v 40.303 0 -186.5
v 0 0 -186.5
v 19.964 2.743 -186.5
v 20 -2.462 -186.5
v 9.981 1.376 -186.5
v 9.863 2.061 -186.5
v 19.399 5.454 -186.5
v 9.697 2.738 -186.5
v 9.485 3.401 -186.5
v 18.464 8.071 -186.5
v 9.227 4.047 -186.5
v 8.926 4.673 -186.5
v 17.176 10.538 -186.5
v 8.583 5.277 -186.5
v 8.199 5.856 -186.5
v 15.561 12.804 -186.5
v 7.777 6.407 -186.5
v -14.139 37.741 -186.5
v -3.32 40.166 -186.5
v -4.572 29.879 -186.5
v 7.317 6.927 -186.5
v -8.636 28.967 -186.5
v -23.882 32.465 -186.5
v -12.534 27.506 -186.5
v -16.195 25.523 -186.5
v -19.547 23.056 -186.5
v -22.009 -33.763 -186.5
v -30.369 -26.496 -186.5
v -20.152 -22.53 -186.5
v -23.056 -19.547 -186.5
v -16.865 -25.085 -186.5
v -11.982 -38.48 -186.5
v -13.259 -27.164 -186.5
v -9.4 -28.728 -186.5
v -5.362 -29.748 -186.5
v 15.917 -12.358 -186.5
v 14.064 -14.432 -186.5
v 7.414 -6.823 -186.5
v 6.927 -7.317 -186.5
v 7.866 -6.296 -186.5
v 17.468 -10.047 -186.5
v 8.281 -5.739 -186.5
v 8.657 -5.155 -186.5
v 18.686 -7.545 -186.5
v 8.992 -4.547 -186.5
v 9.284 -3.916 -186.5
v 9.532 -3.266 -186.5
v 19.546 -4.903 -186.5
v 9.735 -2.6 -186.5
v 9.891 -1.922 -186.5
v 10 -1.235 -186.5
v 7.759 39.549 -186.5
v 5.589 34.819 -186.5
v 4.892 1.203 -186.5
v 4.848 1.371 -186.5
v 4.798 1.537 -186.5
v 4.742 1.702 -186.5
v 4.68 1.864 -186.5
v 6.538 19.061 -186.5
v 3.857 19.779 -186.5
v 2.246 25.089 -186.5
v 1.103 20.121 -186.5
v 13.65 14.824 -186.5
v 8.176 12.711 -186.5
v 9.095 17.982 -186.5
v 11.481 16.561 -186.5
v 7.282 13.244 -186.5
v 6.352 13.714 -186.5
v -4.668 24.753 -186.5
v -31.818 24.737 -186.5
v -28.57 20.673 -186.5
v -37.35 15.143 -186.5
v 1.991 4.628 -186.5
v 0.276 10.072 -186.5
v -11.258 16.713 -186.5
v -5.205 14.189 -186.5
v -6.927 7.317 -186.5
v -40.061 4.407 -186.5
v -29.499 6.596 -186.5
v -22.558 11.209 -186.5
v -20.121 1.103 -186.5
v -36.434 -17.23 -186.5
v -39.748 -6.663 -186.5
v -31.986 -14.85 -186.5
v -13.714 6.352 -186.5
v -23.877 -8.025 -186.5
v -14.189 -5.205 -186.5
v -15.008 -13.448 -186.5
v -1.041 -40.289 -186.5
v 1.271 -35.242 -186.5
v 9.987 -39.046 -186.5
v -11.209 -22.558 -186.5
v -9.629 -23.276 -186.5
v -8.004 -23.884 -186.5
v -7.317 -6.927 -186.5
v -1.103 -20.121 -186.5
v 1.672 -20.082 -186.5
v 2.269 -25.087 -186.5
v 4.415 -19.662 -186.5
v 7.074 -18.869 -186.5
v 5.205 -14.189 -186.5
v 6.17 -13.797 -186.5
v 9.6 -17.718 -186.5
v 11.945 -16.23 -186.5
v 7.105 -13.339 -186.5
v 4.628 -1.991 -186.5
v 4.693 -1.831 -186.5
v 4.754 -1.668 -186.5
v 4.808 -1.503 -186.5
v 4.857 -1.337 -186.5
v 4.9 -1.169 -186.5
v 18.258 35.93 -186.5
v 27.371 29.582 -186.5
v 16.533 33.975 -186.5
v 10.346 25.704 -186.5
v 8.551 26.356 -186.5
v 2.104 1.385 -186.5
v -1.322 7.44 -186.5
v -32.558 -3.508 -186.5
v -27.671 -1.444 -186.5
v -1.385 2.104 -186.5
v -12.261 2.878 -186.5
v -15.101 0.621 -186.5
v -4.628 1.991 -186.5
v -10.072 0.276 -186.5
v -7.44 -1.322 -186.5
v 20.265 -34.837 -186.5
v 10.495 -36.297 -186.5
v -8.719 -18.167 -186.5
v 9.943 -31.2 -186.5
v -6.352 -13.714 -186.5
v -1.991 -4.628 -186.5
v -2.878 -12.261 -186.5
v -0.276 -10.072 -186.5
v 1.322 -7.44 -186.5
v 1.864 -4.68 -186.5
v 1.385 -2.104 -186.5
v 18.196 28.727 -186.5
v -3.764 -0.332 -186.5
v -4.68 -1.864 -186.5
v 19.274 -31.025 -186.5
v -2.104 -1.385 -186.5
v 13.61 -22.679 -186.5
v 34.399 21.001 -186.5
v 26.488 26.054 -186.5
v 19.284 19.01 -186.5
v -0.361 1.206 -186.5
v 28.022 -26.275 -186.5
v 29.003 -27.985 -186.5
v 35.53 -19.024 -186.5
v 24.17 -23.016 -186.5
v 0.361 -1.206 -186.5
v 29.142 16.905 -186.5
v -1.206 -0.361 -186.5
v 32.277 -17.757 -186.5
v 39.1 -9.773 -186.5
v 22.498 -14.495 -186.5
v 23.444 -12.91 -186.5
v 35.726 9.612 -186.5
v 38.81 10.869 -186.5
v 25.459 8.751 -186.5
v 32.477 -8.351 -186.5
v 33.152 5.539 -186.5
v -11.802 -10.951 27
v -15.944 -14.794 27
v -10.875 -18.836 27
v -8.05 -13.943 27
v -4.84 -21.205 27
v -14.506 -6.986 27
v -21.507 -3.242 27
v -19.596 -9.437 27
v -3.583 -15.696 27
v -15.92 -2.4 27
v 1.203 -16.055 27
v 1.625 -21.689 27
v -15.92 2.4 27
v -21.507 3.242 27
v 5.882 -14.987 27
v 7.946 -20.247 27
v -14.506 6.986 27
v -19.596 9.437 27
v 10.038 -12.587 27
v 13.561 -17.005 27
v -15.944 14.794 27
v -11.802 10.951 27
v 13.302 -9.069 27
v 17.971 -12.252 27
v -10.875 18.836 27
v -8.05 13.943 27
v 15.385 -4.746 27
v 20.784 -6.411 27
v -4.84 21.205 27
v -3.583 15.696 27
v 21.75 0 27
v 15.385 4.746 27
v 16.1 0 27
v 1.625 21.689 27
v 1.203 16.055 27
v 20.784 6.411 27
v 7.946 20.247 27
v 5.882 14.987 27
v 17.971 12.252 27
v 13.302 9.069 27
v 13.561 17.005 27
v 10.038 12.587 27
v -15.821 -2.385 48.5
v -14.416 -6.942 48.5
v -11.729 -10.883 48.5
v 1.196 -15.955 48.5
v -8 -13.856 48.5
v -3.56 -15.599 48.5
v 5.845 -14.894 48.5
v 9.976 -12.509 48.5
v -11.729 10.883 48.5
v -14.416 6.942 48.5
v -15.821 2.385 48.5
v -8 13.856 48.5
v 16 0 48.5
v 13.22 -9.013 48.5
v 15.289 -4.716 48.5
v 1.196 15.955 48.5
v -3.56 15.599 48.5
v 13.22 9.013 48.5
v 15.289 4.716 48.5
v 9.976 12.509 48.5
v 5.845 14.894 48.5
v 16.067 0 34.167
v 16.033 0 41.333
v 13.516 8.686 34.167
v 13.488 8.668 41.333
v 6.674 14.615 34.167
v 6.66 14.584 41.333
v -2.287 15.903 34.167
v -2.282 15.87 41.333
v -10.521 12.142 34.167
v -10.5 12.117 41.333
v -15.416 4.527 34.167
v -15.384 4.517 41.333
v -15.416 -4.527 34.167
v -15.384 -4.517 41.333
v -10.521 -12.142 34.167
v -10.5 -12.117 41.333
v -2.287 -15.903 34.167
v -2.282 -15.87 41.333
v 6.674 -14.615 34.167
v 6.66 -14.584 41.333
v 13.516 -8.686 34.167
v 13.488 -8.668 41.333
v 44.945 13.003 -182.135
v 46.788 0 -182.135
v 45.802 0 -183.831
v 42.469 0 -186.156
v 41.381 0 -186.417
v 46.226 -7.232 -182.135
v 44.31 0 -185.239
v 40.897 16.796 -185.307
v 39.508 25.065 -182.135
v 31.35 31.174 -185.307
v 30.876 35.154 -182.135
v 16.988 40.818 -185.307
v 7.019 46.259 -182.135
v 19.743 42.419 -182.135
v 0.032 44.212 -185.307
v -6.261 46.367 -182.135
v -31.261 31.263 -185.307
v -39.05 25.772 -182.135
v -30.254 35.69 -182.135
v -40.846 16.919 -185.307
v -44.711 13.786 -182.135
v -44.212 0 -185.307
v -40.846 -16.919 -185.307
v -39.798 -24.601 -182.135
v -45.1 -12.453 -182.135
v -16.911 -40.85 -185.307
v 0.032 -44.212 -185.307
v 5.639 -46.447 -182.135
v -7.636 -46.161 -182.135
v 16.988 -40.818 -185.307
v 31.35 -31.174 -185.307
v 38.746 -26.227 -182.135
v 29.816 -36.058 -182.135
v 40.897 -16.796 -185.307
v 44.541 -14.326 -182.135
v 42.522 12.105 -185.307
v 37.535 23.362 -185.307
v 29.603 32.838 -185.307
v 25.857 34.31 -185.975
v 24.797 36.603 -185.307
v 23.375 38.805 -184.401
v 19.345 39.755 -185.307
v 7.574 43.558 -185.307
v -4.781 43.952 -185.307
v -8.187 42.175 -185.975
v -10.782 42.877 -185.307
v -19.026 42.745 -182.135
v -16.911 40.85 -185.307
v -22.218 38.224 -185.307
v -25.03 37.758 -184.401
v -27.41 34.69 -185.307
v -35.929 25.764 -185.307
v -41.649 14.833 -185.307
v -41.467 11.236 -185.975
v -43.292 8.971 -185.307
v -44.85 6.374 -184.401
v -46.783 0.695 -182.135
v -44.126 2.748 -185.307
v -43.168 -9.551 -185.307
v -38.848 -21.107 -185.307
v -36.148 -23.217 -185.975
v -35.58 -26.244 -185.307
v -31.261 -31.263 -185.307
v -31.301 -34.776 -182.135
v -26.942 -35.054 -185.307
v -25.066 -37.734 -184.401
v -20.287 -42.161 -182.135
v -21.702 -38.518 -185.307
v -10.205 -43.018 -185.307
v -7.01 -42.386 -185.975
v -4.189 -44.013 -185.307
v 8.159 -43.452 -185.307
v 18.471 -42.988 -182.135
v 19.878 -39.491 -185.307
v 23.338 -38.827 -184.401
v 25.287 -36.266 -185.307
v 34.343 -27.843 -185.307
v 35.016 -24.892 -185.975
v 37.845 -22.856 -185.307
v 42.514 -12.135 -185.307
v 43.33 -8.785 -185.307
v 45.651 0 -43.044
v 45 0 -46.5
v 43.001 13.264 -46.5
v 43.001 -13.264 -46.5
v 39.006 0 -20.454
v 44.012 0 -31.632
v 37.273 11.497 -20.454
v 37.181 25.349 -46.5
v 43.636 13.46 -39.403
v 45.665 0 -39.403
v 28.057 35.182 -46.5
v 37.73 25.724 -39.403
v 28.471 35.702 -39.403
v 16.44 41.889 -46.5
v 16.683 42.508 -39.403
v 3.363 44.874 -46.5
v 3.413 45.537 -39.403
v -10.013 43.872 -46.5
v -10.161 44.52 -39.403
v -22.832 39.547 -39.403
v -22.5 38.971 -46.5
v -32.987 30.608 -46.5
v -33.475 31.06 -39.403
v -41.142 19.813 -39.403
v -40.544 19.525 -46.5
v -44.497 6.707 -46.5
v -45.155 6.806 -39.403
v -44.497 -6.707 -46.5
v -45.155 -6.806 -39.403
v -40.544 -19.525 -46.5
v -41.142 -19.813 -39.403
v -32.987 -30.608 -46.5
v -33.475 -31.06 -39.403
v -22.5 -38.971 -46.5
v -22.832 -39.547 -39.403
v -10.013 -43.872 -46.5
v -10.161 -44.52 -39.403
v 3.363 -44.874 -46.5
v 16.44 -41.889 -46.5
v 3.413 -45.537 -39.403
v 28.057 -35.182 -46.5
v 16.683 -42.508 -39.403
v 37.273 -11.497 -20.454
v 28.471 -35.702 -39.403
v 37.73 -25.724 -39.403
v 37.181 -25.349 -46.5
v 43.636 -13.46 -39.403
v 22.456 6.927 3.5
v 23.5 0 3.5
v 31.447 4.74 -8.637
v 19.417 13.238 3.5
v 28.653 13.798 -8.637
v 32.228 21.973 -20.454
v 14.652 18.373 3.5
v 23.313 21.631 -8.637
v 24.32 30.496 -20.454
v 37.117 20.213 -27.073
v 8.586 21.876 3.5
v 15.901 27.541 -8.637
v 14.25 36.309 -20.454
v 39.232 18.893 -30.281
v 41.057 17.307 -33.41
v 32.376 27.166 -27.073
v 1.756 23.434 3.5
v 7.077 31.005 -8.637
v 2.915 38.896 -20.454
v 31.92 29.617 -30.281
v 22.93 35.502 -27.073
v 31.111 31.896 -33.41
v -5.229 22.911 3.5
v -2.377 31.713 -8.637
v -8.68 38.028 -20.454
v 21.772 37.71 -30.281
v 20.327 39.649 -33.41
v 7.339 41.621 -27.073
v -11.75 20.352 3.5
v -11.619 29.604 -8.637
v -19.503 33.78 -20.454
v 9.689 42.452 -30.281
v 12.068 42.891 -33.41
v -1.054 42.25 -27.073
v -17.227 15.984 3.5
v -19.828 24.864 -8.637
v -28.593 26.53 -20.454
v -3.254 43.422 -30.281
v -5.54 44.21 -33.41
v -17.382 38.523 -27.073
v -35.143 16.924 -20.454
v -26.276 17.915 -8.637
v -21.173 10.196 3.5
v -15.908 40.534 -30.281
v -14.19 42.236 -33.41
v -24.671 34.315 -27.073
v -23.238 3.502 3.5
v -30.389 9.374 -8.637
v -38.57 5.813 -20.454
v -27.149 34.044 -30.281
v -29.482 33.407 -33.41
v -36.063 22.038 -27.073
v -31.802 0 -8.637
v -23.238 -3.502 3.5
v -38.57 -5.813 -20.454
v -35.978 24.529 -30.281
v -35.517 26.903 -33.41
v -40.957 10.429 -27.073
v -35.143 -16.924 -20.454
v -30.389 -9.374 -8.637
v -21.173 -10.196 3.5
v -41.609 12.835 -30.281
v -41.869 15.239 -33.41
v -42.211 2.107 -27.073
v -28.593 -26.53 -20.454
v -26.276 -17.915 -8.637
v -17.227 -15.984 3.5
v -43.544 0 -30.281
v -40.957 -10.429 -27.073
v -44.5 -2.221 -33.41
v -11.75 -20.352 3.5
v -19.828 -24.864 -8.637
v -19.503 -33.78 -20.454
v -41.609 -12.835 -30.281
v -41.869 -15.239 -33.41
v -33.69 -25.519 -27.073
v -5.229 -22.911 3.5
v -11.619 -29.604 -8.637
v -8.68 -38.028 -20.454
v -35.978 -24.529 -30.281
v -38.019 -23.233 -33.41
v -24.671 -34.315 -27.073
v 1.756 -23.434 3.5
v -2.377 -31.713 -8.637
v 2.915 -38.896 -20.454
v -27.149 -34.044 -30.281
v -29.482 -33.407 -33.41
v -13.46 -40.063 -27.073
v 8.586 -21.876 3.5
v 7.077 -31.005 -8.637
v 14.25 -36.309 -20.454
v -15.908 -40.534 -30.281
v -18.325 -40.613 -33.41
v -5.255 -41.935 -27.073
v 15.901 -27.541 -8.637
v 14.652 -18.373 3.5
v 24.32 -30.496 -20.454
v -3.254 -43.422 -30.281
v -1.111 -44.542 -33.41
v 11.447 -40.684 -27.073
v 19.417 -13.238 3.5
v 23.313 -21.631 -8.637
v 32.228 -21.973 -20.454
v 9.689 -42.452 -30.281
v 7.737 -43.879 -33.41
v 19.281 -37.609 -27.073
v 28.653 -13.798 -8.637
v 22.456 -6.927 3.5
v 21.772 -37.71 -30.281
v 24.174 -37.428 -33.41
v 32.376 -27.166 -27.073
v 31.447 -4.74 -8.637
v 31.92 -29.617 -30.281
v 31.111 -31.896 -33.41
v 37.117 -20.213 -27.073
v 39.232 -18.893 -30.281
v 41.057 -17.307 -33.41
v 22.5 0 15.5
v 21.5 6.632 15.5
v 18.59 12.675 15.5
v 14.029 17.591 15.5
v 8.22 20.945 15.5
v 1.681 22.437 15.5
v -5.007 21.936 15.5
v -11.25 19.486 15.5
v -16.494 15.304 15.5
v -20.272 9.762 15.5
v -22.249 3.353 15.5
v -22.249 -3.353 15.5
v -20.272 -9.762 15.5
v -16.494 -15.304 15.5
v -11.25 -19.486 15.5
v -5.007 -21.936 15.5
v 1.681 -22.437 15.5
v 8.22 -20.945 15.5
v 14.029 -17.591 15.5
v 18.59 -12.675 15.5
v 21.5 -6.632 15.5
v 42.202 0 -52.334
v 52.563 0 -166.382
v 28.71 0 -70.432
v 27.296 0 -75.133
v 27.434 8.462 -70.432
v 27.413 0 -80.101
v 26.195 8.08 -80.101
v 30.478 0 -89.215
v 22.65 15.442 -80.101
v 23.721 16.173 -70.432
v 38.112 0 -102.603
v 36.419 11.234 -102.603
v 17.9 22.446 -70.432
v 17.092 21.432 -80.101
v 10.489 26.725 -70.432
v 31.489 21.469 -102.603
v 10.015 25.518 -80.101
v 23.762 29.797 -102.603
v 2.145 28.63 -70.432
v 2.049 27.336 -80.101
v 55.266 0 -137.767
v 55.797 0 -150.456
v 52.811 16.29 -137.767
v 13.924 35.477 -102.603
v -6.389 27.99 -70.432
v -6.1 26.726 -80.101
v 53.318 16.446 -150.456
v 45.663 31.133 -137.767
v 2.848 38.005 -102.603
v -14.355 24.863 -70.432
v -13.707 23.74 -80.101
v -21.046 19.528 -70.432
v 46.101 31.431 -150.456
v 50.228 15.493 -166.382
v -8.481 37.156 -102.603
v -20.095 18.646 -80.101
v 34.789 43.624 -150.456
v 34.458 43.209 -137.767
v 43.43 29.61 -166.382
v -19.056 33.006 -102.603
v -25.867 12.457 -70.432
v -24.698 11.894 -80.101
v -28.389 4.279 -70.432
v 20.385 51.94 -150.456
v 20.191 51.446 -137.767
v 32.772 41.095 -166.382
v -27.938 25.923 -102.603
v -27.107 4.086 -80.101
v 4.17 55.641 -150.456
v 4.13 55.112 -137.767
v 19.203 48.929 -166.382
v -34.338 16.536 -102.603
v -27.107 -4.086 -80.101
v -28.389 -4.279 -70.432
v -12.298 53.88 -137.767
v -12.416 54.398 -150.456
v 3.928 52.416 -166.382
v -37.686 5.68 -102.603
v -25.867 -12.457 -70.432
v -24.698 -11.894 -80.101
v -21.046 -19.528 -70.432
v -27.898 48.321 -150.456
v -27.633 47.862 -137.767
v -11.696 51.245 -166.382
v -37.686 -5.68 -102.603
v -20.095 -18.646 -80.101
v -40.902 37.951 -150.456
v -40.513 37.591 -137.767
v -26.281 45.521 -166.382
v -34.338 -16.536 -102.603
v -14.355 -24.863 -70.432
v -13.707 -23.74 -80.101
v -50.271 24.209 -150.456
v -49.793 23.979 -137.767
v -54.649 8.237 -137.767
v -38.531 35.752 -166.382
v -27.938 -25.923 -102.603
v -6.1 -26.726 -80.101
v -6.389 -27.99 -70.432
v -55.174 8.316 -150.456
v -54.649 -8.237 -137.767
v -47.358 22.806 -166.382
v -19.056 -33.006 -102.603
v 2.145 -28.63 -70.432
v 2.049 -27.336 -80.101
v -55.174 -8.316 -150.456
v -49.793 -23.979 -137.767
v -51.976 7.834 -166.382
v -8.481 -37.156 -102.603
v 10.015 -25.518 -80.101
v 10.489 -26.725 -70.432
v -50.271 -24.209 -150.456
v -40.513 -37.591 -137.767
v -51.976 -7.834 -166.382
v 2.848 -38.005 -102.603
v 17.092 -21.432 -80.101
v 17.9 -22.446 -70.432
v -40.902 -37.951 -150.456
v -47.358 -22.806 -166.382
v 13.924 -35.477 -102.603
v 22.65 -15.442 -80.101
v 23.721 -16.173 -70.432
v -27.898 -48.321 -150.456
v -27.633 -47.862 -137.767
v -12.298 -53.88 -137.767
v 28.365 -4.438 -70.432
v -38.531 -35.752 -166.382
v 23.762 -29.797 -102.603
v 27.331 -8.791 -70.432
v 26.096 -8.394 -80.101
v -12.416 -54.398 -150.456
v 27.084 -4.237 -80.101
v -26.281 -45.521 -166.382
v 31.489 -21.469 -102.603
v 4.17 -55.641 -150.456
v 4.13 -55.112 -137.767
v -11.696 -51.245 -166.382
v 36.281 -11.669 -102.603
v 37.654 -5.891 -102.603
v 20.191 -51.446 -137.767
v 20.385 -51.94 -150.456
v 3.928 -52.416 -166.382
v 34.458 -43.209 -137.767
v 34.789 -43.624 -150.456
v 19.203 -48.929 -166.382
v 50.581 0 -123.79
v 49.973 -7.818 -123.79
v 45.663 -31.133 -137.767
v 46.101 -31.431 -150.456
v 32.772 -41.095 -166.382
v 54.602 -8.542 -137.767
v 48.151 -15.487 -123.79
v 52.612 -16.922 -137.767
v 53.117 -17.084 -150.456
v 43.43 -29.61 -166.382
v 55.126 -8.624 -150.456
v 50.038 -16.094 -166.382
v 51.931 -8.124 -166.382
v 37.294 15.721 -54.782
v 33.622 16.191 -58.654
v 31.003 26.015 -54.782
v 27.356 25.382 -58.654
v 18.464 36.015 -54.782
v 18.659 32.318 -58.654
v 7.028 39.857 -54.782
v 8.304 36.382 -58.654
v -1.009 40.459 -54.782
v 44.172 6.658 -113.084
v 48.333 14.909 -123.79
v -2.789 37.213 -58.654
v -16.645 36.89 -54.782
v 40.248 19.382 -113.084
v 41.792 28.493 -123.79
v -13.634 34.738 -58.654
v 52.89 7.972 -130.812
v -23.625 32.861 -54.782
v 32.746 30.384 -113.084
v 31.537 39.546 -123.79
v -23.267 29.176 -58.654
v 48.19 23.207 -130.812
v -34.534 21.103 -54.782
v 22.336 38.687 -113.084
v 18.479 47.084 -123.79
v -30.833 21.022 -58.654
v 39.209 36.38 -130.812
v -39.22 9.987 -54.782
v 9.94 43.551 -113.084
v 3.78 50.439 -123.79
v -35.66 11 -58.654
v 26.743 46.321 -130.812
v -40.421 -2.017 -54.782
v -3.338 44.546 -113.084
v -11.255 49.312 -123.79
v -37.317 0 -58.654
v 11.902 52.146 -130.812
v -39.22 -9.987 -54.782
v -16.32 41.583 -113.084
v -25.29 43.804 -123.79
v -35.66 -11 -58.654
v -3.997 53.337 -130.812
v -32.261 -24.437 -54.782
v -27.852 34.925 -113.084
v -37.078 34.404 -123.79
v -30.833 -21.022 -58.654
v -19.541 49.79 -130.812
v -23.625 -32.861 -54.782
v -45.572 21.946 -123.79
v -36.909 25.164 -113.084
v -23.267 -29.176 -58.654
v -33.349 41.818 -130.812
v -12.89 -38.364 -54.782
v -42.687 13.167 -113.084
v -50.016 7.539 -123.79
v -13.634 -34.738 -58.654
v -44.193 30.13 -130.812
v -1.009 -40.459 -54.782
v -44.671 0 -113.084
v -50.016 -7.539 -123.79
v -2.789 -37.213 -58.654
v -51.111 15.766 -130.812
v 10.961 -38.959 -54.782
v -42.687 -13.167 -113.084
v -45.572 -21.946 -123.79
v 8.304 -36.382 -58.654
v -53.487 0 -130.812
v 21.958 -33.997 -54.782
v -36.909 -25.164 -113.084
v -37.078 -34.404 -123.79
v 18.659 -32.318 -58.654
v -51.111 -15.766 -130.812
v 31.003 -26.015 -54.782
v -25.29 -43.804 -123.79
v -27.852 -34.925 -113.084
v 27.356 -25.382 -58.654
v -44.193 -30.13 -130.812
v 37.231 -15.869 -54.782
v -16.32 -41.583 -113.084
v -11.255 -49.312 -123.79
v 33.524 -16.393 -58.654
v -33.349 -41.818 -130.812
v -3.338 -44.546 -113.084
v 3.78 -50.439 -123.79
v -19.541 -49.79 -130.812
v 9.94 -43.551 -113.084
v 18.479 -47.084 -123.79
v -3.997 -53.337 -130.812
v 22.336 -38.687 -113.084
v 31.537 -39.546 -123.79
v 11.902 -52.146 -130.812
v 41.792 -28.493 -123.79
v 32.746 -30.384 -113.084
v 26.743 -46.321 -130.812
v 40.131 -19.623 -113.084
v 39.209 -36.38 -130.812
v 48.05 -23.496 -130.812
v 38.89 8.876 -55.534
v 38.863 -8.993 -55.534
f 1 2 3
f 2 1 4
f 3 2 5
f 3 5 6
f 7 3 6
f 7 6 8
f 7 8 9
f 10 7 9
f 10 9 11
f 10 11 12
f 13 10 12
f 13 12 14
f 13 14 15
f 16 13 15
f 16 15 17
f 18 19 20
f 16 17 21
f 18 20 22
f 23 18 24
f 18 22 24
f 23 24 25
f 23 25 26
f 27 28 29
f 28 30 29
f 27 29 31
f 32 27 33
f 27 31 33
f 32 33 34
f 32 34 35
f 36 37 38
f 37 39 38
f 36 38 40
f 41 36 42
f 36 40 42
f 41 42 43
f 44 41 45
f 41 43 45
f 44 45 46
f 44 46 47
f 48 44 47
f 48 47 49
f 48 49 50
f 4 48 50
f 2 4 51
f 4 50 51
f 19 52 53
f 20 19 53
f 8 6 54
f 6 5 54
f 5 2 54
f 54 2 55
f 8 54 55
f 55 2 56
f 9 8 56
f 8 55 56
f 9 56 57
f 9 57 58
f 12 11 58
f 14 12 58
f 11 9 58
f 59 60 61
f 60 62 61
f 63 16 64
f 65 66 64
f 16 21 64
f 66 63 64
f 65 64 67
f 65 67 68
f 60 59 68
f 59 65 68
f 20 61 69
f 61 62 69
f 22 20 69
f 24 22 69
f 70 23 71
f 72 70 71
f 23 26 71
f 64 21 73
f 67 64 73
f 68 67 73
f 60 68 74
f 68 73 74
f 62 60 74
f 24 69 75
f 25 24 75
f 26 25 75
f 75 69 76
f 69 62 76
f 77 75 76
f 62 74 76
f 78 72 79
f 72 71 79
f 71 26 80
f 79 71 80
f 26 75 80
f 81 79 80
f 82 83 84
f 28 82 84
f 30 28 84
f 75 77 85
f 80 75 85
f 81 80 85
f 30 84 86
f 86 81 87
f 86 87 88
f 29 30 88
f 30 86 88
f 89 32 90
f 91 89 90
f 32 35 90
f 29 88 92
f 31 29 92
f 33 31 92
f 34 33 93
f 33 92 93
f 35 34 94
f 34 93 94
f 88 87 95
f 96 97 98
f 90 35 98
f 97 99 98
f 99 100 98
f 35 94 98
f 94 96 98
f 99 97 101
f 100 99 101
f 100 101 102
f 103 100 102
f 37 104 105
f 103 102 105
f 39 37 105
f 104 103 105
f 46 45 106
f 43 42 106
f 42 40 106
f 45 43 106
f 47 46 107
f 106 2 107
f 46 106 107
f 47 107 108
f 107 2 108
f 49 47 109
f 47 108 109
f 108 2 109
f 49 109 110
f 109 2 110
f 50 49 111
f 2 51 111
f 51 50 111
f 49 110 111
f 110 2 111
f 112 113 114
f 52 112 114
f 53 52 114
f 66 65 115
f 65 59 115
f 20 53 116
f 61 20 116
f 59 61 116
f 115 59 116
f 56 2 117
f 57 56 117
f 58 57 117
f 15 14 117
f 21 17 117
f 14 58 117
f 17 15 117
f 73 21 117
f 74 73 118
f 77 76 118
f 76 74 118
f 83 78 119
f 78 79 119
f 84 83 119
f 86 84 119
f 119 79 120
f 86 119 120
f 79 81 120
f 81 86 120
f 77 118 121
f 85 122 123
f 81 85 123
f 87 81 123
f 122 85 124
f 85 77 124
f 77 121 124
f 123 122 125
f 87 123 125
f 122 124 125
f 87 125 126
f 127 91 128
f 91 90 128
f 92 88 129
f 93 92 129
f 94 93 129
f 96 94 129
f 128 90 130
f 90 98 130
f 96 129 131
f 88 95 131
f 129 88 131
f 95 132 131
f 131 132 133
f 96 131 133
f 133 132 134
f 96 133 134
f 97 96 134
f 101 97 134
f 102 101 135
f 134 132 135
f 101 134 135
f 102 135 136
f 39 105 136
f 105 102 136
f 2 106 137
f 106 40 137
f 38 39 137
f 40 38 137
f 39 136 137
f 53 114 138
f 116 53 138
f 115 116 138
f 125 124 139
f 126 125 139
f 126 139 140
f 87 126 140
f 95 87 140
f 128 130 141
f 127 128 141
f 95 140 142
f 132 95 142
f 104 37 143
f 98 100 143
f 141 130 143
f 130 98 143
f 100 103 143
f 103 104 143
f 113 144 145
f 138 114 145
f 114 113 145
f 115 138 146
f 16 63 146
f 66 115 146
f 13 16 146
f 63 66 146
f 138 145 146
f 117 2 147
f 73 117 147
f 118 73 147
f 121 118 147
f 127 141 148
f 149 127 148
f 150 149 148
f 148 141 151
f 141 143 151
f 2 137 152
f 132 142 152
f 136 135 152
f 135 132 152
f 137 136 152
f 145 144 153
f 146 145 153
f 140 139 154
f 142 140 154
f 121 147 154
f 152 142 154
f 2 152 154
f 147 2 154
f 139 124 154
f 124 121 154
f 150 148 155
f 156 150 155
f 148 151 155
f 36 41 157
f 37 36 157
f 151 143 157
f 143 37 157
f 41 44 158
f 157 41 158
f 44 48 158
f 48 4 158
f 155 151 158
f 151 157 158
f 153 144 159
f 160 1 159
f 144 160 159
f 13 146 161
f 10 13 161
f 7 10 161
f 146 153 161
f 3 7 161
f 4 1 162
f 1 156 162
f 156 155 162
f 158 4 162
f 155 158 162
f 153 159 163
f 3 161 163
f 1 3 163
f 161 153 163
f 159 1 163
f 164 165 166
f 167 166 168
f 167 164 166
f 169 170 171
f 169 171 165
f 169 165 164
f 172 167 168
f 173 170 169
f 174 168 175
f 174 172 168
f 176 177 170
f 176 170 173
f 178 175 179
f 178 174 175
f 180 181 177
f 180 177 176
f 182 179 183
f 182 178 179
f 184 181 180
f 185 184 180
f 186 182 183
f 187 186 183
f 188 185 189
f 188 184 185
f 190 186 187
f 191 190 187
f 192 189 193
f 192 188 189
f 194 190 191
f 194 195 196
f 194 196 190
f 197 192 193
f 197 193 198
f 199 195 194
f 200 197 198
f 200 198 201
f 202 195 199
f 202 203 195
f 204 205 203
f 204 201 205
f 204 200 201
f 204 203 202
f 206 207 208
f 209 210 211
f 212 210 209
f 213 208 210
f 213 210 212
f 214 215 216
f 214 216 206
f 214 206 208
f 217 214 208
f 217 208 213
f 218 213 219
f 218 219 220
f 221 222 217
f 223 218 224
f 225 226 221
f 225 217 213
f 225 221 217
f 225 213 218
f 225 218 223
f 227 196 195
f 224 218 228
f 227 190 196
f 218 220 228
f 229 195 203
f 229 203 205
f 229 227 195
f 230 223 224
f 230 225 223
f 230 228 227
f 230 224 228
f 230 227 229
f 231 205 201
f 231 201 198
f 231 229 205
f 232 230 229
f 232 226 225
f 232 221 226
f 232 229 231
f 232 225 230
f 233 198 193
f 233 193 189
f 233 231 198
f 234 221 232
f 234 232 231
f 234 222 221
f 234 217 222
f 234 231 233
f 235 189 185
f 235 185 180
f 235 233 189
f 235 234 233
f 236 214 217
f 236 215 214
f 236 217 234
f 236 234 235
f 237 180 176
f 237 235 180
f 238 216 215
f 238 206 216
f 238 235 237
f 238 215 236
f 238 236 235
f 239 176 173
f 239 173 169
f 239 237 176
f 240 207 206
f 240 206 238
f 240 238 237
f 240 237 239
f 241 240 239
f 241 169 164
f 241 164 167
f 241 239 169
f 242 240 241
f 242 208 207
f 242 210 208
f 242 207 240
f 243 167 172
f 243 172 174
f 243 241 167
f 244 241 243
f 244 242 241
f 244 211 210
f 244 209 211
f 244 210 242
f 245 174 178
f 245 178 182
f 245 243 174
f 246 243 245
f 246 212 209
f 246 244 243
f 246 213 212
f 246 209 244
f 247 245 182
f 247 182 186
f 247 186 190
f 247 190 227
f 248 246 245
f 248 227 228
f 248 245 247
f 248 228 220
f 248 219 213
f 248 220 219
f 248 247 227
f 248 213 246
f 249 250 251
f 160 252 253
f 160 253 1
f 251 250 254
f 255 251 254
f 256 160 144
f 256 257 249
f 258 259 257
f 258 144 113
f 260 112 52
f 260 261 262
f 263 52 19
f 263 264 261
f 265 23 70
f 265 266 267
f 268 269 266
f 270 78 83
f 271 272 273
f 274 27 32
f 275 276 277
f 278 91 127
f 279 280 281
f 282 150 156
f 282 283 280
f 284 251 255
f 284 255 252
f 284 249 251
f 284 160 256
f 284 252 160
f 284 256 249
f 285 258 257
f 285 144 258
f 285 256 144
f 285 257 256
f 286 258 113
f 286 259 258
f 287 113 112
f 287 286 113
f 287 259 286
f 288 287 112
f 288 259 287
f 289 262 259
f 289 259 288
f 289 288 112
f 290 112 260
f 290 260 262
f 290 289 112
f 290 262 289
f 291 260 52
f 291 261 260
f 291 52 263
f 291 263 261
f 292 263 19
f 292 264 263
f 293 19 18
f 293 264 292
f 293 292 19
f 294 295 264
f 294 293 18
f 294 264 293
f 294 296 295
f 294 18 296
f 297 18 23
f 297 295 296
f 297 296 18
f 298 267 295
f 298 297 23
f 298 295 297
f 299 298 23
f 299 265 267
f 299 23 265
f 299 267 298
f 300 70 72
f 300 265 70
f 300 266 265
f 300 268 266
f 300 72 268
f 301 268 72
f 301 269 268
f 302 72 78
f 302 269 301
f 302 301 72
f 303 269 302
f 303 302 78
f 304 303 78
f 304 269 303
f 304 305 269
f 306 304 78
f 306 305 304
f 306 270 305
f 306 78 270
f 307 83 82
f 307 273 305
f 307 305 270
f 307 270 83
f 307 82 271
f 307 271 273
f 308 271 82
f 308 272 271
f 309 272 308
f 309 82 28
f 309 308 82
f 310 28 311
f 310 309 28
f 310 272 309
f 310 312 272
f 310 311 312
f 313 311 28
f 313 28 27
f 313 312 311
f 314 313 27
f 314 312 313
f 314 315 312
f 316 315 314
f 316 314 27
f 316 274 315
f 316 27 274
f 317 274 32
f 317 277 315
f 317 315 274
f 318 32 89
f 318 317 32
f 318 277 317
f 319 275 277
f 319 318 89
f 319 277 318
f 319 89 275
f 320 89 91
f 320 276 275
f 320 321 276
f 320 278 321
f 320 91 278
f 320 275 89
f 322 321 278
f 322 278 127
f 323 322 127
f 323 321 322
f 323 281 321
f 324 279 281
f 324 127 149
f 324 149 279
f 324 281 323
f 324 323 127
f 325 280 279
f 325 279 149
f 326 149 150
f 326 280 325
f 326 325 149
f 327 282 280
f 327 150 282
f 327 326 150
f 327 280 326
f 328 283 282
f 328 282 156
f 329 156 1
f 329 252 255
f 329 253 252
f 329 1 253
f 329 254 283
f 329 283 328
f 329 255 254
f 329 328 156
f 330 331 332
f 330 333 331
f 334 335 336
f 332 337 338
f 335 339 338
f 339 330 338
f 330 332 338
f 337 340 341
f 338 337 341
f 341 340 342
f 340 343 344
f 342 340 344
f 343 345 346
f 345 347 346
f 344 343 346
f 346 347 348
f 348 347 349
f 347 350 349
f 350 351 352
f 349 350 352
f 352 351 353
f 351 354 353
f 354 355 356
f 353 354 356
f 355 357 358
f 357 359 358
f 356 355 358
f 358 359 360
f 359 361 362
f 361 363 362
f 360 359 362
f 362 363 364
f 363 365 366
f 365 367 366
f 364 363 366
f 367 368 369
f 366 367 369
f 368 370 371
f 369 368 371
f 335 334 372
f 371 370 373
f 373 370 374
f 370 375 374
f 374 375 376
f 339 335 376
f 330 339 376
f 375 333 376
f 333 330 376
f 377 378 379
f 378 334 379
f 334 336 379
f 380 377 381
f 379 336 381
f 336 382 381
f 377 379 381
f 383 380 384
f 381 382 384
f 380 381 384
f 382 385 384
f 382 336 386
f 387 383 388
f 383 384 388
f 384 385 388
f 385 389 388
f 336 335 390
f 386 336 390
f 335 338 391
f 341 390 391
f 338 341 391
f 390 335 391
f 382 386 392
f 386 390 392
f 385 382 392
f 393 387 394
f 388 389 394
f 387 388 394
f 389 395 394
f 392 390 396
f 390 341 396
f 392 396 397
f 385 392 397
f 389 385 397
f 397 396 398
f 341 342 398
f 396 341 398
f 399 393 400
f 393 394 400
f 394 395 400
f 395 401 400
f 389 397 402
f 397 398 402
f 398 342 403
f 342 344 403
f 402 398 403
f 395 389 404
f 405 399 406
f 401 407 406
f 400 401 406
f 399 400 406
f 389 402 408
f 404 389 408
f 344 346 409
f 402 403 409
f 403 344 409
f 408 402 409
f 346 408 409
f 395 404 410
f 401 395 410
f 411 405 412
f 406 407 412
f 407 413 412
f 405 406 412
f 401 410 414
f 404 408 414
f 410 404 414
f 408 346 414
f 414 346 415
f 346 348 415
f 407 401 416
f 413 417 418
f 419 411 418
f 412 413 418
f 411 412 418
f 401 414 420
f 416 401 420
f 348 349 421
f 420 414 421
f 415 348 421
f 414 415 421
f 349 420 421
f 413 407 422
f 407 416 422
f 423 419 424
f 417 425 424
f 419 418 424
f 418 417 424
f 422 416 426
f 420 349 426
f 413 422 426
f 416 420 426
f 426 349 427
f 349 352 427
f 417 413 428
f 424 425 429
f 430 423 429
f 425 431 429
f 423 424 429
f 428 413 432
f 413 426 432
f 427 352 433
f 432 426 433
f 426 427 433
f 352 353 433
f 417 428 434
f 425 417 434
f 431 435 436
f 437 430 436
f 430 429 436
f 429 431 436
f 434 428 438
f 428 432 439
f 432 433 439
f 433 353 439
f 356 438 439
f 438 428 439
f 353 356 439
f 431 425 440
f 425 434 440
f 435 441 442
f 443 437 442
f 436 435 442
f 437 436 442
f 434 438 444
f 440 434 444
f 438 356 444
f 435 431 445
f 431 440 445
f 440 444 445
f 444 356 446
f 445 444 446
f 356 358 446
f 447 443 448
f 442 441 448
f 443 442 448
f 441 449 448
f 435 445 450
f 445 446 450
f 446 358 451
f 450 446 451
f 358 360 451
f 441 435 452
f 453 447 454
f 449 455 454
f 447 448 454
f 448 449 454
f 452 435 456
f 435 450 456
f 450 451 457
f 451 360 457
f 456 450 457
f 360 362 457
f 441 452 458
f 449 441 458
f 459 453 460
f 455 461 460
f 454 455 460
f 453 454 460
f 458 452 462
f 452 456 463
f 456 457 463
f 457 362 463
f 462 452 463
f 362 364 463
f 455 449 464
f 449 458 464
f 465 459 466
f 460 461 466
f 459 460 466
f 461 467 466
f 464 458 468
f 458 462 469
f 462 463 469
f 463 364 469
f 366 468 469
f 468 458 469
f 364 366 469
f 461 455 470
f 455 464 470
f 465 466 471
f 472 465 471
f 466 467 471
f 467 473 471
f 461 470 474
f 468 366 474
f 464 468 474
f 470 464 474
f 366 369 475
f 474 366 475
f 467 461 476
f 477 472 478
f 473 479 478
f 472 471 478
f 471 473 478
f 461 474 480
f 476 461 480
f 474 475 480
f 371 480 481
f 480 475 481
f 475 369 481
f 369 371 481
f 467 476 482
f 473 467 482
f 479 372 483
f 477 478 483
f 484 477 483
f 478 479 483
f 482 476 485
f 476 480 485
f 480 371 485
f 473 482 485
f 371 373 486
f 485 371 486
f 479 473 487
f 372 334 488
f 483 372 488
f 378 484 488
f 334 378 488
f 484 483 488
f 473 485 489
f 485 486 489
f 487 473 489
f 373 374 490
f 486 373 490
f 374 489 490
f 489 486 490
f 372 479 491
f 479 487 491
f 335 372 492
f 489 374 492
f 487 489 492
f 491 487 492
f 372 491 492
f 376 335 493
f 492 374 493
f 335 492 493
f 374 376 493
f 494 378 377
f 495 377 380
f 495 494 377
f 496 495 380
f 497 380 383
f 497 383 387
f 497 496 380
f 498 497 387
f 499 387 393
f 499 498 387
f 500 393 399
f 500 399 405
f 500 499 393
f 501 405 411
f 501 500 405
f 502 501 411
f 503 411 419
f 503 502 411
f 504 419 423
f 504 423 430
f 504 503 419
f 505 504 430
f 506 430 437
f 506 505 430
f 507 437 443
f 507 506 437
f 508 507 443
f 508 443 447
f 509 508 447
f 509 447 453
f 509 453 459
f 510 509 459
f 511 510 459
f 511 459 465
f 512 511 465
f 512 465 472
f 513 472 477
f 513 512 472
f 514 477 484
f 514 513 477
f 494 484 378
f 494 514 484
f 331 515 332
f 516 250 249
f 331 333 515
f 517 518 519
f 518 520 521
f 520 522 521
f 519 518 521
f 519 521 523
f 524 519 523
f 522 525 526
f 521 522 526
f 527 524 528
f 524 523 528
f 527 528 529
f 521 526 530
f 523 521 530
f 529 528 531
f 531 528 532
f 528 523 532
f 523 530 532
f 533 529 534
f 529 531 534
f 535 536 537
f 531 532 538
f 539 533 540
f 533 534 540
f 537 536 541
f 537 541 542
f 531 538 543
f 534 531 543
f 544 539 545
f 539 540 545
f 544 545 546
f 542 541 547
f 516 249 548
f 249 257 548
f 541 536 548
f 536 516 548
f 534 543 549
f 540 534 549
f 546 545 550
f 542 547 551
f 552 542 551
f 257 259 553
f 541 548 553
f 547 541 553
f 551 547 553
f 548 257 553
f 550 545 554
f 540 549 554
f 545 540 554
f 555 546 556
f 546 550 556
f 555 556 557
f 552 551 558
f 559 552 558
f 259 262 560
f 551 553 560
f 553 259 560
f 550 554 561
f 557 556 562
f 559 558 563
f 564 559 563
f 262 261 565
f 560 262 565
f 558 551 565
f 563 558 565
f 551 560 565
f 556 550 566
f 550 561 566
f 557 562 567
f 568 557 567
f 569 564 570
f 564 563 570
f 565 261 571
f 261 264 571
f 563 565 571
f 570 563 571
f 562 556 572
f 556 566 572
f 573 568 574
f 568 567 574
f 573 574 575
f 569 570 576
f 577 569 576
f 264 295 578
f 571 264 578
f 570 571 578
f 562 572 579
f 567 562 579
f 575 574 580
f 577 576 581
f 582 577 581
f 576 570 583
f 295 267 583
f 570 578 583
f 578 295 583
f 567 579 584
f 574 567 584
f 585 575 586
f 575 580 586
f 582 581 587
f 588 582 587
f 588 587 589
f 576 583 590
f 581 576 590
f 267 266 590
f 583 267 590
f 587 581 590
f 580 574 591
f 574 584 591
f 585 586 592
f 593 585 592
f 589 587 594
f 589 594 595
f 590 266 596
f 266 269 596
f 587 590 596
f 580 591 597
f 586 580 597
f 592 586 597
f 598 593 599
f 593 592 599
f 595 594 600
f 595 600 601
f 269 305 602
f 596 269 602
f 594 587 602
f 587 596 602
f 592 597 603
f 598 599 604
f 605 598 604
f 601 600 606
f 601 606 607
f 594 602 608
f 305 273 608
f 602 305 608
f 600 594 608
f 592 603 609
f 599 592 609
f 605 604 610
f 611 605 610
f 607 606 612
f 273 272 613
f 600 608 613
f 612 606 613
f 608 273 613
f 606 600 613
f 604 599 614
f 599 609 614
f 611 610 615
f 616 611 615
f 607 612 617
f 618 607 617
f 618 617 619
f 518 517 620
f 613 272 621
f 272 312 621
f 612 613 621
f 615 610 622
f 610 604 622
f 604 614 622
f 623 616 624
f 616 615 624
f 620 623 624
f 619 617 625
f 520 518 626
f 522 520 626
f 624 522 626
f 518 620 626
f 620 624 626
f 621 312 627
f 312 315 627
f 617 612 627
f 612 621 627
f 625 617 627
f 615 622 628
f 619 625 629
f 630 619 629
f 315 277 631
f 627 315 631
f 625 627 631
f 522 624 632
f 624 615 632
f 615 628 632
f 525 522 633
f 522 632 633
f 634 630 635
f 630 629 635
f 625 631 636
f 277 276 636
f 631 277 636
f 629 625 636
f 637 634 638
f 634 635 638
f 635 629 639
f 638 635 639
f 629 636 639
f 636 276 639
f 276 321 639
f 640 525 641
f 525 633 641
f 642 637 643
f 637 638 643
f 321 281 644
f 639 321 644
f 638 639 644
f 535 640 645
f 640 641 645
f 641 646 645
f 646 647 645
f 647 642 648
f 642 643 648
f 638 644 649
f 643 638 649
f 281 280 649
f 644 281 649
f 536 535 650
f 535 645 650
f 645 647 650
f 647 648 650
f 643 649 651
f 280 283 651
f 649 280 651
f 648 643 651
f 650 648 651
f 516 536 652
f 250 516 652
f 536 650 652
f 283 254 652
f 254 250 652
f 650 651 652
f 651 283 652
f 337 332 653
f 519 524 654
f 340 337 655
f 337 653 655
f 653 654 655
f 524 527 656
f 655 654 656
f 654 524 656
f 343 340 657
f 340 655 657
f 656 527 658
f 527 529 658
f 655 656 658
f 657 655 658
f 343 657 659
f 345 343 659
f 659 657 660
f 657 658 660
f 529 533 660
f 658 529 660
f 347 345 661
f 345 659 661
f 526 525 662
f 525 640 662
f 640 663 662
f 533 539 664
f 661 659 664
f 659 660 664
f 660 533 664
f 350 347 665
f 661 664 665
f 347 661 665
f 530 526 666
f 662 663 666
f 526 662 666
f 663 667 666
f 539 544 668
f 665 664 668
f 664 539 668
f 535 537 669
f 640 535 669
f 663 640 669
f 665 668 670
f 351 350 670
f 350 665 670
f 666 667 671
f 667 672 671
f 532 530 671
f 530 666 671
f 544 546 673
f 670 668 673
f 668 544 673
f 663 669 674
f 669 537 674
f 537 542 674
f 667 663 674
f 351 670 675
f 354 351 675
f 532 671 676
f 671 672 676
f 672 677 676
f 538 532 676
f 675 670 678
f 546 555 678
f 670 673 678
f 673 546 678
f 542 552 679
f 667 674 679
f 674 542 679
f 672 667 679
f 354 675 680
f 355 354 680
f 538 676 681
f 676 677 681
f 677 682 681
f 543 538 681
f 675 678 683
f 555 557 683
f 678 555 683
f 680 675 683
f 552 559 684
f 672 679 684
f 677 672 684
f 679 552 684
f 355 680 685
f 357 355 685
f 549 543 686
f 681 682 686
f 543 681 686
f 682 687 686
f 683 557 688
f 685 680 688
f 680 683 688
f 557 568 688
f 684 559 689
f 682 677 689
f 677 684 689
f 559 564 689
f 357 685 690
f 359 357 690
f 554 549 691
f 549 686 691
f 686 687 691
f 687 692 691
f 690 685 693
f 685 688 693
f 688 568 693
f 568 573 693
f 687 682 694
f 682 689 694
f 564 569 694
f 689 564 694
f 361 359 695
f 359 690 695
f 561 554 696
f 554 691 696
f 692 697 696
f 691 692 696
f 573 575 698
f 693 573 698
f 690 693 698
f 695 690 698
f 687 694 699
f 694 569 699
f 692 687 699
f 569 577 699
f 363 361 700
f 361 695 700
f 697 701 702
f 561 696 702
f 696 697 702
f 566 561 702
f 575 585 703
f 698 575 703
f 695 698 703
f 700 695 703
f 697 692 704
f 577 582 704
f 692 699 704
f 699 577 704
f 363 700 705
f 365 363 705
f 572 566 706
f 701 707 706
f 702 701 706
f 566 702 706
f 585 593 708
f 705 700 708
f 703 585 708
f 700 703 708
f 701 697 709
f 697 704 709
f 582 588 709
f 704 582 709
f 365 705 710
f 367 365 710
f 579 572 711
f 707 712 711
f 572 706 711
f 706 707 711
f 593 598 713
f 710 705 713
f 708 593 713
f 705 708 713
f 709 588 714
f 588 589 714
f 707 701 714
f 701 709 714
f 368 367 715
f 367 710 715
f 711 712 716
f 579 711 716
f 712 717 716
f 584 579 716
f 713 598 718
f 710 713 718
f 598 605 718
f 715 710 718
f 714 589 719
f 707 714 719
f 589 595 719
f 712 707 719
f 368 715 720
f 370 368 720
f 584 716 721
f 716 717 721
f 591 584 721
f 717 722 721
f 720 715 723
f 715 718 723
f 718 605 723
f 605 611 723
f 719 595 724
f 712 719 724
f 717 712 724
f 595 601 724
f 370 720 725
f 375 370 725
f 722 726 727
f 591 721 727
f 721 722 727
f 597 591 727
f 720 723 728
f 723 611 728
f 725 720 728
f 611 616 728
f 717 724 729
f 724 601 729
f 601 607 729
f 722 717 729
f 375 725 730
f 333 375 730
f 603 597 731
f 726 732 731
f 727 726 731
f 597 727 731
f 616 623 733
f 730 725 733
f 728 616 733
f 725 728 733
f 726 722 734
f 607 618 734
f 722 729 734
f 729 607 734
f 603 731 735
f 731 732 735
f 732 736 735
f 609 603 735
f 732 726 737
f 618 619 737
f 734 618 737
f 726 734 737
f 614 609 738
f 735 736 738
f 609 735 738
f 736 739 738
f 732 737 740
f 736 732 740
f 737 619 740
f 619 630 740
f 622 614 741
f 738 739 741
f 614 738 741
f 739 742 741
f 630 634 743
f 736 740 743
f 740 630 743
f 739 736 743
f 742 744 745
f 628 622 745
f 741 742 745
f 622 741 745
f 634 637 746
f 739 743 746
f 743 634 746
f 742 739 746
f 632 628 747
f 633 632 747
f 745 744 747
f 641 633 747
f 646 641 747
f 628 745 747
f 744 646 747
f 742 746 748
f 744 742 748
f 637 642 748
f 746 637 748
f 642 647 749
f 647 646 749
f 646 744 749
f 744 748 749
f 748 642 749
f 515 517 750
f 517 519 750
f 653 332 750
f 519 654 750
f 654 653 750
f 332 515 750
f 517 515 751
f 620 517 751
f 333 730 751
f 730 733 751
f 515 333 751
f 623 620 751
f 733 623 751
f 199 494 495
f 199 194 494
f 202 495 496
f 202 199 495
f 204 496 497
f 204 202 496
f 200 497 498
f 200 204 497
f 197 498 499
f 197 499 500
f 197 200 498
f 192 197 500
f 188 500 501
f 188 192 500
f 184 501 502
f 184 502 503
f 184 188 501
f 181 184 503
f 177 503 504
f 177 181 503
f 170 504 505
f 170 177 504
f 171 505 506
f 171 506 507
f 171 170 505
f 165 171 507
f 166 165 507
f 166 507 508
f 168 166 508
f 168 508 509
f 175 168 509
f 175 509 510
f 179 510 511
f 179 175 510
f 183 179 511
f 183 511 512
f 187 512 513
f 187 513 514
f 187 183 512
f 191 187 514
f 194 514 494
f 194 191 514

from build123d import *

# Parameters (mm, degrees)
F0_R  = 16
F3_R  = 16
F2_R  = 22.5
F6_R  = 21.75
F8_R  = 16.1
F10_R = 16
F21_R = 7
F22_R = 23.5
F23_R = 22.5


with BuildPart() as f4:
    # F0 (on Top) → F4 section 0
    with BuildSketch(Plane.XY):
        Circle(F0_R)
    # F3 (on offset) → F4 section 1
    with BuildSketch(Plane.XY.offset(15.5)):
        Circle(F3_R)
    loft()

    # F2 (on offset) → F7 section 0
    with BuildSketch(Plane.XY.offset(15.5)):
        Circle(F2_R)
    # F6 (on offset) → F7 section 1
    with BuildSketch(Plane.XY.offset(27)):
        Circle(F6_R)
    loft()

    # F8 (on face) → F11 section 0
    with BuildSketch(Plane.XY.offset(27)):
        Circle(F8_R)
    # F10 (on offset) → F11 section 1
    with BuildSketch(Plane.XY.offset(48.5)):
        Circle(F10_R)
    loft()

    # F20: sweep along a path in F16
    with BuildLine(Plane.XY.offset(-186.5)) as f20_path:
        CenterArc((0, 0), 45, 0, 360)
    # F19 (on Right) → F20 (sweep)
    with BuildSketch(Plane.YZ):
        with BuildLine():
            add(Edge.make_bspline(
                [(-23.5, 3.5), (-36.2275912486, -14.7854639769), (-48.9551824971, -33.0709279537), (-45, -46.5)],
                knots=[0, 0, 0, 0, 0.2584292307, 0.2584292307, 0.2584292307, 0.2584292307], degree=3))
            Line((-45, -46.5), (0, -46.5))
            Line((0, -46.5), (0, 3.5))
            Line((0, 3.5), (-23.5, 3.5))
        make_face()
        with BuildLine():
            Line((0, -46.5), (-45, -46.5))
            add(Edge.make_bspline(
                [(-45, -46.5), (-41.8623538668, -57.1532823728), (-9.9225968185, -74.947210298), (-67.6267764195, -131.4854286233), (-52.4119770329, -168.4785756505), (-45, -186.5)],
                knots=[0.2584292307, 0.2584292307, 0.2584292307, 0.2584292307, 0.4634411301, 0.7386122604, 1, 1, 1, 1], degree=3))
            Line((-45, -186.5), (0, -186.5))
            Line((0, -186.5), (0, -46.5))
        make_face()
    sweep(path=f20_path.line)

    # F21
    f21_edges = [f4.edges().sort_by_distance(p)[0] for p in [
        (-45, 0, -186.5),
    ]]
    fillet(f21_edges, radius=F21_R)

    # F22 (on offset) → F24 section 0
    with BuildSketch(Plane.XY.offset(3.5)):
        Circle(F22_R)
    # F23 (on offset) → F24 section 1
    with BuildSketch(Plane.XY.offset(15.5)):
        Circle(F23_R)
    loft()


solid = f4.part
